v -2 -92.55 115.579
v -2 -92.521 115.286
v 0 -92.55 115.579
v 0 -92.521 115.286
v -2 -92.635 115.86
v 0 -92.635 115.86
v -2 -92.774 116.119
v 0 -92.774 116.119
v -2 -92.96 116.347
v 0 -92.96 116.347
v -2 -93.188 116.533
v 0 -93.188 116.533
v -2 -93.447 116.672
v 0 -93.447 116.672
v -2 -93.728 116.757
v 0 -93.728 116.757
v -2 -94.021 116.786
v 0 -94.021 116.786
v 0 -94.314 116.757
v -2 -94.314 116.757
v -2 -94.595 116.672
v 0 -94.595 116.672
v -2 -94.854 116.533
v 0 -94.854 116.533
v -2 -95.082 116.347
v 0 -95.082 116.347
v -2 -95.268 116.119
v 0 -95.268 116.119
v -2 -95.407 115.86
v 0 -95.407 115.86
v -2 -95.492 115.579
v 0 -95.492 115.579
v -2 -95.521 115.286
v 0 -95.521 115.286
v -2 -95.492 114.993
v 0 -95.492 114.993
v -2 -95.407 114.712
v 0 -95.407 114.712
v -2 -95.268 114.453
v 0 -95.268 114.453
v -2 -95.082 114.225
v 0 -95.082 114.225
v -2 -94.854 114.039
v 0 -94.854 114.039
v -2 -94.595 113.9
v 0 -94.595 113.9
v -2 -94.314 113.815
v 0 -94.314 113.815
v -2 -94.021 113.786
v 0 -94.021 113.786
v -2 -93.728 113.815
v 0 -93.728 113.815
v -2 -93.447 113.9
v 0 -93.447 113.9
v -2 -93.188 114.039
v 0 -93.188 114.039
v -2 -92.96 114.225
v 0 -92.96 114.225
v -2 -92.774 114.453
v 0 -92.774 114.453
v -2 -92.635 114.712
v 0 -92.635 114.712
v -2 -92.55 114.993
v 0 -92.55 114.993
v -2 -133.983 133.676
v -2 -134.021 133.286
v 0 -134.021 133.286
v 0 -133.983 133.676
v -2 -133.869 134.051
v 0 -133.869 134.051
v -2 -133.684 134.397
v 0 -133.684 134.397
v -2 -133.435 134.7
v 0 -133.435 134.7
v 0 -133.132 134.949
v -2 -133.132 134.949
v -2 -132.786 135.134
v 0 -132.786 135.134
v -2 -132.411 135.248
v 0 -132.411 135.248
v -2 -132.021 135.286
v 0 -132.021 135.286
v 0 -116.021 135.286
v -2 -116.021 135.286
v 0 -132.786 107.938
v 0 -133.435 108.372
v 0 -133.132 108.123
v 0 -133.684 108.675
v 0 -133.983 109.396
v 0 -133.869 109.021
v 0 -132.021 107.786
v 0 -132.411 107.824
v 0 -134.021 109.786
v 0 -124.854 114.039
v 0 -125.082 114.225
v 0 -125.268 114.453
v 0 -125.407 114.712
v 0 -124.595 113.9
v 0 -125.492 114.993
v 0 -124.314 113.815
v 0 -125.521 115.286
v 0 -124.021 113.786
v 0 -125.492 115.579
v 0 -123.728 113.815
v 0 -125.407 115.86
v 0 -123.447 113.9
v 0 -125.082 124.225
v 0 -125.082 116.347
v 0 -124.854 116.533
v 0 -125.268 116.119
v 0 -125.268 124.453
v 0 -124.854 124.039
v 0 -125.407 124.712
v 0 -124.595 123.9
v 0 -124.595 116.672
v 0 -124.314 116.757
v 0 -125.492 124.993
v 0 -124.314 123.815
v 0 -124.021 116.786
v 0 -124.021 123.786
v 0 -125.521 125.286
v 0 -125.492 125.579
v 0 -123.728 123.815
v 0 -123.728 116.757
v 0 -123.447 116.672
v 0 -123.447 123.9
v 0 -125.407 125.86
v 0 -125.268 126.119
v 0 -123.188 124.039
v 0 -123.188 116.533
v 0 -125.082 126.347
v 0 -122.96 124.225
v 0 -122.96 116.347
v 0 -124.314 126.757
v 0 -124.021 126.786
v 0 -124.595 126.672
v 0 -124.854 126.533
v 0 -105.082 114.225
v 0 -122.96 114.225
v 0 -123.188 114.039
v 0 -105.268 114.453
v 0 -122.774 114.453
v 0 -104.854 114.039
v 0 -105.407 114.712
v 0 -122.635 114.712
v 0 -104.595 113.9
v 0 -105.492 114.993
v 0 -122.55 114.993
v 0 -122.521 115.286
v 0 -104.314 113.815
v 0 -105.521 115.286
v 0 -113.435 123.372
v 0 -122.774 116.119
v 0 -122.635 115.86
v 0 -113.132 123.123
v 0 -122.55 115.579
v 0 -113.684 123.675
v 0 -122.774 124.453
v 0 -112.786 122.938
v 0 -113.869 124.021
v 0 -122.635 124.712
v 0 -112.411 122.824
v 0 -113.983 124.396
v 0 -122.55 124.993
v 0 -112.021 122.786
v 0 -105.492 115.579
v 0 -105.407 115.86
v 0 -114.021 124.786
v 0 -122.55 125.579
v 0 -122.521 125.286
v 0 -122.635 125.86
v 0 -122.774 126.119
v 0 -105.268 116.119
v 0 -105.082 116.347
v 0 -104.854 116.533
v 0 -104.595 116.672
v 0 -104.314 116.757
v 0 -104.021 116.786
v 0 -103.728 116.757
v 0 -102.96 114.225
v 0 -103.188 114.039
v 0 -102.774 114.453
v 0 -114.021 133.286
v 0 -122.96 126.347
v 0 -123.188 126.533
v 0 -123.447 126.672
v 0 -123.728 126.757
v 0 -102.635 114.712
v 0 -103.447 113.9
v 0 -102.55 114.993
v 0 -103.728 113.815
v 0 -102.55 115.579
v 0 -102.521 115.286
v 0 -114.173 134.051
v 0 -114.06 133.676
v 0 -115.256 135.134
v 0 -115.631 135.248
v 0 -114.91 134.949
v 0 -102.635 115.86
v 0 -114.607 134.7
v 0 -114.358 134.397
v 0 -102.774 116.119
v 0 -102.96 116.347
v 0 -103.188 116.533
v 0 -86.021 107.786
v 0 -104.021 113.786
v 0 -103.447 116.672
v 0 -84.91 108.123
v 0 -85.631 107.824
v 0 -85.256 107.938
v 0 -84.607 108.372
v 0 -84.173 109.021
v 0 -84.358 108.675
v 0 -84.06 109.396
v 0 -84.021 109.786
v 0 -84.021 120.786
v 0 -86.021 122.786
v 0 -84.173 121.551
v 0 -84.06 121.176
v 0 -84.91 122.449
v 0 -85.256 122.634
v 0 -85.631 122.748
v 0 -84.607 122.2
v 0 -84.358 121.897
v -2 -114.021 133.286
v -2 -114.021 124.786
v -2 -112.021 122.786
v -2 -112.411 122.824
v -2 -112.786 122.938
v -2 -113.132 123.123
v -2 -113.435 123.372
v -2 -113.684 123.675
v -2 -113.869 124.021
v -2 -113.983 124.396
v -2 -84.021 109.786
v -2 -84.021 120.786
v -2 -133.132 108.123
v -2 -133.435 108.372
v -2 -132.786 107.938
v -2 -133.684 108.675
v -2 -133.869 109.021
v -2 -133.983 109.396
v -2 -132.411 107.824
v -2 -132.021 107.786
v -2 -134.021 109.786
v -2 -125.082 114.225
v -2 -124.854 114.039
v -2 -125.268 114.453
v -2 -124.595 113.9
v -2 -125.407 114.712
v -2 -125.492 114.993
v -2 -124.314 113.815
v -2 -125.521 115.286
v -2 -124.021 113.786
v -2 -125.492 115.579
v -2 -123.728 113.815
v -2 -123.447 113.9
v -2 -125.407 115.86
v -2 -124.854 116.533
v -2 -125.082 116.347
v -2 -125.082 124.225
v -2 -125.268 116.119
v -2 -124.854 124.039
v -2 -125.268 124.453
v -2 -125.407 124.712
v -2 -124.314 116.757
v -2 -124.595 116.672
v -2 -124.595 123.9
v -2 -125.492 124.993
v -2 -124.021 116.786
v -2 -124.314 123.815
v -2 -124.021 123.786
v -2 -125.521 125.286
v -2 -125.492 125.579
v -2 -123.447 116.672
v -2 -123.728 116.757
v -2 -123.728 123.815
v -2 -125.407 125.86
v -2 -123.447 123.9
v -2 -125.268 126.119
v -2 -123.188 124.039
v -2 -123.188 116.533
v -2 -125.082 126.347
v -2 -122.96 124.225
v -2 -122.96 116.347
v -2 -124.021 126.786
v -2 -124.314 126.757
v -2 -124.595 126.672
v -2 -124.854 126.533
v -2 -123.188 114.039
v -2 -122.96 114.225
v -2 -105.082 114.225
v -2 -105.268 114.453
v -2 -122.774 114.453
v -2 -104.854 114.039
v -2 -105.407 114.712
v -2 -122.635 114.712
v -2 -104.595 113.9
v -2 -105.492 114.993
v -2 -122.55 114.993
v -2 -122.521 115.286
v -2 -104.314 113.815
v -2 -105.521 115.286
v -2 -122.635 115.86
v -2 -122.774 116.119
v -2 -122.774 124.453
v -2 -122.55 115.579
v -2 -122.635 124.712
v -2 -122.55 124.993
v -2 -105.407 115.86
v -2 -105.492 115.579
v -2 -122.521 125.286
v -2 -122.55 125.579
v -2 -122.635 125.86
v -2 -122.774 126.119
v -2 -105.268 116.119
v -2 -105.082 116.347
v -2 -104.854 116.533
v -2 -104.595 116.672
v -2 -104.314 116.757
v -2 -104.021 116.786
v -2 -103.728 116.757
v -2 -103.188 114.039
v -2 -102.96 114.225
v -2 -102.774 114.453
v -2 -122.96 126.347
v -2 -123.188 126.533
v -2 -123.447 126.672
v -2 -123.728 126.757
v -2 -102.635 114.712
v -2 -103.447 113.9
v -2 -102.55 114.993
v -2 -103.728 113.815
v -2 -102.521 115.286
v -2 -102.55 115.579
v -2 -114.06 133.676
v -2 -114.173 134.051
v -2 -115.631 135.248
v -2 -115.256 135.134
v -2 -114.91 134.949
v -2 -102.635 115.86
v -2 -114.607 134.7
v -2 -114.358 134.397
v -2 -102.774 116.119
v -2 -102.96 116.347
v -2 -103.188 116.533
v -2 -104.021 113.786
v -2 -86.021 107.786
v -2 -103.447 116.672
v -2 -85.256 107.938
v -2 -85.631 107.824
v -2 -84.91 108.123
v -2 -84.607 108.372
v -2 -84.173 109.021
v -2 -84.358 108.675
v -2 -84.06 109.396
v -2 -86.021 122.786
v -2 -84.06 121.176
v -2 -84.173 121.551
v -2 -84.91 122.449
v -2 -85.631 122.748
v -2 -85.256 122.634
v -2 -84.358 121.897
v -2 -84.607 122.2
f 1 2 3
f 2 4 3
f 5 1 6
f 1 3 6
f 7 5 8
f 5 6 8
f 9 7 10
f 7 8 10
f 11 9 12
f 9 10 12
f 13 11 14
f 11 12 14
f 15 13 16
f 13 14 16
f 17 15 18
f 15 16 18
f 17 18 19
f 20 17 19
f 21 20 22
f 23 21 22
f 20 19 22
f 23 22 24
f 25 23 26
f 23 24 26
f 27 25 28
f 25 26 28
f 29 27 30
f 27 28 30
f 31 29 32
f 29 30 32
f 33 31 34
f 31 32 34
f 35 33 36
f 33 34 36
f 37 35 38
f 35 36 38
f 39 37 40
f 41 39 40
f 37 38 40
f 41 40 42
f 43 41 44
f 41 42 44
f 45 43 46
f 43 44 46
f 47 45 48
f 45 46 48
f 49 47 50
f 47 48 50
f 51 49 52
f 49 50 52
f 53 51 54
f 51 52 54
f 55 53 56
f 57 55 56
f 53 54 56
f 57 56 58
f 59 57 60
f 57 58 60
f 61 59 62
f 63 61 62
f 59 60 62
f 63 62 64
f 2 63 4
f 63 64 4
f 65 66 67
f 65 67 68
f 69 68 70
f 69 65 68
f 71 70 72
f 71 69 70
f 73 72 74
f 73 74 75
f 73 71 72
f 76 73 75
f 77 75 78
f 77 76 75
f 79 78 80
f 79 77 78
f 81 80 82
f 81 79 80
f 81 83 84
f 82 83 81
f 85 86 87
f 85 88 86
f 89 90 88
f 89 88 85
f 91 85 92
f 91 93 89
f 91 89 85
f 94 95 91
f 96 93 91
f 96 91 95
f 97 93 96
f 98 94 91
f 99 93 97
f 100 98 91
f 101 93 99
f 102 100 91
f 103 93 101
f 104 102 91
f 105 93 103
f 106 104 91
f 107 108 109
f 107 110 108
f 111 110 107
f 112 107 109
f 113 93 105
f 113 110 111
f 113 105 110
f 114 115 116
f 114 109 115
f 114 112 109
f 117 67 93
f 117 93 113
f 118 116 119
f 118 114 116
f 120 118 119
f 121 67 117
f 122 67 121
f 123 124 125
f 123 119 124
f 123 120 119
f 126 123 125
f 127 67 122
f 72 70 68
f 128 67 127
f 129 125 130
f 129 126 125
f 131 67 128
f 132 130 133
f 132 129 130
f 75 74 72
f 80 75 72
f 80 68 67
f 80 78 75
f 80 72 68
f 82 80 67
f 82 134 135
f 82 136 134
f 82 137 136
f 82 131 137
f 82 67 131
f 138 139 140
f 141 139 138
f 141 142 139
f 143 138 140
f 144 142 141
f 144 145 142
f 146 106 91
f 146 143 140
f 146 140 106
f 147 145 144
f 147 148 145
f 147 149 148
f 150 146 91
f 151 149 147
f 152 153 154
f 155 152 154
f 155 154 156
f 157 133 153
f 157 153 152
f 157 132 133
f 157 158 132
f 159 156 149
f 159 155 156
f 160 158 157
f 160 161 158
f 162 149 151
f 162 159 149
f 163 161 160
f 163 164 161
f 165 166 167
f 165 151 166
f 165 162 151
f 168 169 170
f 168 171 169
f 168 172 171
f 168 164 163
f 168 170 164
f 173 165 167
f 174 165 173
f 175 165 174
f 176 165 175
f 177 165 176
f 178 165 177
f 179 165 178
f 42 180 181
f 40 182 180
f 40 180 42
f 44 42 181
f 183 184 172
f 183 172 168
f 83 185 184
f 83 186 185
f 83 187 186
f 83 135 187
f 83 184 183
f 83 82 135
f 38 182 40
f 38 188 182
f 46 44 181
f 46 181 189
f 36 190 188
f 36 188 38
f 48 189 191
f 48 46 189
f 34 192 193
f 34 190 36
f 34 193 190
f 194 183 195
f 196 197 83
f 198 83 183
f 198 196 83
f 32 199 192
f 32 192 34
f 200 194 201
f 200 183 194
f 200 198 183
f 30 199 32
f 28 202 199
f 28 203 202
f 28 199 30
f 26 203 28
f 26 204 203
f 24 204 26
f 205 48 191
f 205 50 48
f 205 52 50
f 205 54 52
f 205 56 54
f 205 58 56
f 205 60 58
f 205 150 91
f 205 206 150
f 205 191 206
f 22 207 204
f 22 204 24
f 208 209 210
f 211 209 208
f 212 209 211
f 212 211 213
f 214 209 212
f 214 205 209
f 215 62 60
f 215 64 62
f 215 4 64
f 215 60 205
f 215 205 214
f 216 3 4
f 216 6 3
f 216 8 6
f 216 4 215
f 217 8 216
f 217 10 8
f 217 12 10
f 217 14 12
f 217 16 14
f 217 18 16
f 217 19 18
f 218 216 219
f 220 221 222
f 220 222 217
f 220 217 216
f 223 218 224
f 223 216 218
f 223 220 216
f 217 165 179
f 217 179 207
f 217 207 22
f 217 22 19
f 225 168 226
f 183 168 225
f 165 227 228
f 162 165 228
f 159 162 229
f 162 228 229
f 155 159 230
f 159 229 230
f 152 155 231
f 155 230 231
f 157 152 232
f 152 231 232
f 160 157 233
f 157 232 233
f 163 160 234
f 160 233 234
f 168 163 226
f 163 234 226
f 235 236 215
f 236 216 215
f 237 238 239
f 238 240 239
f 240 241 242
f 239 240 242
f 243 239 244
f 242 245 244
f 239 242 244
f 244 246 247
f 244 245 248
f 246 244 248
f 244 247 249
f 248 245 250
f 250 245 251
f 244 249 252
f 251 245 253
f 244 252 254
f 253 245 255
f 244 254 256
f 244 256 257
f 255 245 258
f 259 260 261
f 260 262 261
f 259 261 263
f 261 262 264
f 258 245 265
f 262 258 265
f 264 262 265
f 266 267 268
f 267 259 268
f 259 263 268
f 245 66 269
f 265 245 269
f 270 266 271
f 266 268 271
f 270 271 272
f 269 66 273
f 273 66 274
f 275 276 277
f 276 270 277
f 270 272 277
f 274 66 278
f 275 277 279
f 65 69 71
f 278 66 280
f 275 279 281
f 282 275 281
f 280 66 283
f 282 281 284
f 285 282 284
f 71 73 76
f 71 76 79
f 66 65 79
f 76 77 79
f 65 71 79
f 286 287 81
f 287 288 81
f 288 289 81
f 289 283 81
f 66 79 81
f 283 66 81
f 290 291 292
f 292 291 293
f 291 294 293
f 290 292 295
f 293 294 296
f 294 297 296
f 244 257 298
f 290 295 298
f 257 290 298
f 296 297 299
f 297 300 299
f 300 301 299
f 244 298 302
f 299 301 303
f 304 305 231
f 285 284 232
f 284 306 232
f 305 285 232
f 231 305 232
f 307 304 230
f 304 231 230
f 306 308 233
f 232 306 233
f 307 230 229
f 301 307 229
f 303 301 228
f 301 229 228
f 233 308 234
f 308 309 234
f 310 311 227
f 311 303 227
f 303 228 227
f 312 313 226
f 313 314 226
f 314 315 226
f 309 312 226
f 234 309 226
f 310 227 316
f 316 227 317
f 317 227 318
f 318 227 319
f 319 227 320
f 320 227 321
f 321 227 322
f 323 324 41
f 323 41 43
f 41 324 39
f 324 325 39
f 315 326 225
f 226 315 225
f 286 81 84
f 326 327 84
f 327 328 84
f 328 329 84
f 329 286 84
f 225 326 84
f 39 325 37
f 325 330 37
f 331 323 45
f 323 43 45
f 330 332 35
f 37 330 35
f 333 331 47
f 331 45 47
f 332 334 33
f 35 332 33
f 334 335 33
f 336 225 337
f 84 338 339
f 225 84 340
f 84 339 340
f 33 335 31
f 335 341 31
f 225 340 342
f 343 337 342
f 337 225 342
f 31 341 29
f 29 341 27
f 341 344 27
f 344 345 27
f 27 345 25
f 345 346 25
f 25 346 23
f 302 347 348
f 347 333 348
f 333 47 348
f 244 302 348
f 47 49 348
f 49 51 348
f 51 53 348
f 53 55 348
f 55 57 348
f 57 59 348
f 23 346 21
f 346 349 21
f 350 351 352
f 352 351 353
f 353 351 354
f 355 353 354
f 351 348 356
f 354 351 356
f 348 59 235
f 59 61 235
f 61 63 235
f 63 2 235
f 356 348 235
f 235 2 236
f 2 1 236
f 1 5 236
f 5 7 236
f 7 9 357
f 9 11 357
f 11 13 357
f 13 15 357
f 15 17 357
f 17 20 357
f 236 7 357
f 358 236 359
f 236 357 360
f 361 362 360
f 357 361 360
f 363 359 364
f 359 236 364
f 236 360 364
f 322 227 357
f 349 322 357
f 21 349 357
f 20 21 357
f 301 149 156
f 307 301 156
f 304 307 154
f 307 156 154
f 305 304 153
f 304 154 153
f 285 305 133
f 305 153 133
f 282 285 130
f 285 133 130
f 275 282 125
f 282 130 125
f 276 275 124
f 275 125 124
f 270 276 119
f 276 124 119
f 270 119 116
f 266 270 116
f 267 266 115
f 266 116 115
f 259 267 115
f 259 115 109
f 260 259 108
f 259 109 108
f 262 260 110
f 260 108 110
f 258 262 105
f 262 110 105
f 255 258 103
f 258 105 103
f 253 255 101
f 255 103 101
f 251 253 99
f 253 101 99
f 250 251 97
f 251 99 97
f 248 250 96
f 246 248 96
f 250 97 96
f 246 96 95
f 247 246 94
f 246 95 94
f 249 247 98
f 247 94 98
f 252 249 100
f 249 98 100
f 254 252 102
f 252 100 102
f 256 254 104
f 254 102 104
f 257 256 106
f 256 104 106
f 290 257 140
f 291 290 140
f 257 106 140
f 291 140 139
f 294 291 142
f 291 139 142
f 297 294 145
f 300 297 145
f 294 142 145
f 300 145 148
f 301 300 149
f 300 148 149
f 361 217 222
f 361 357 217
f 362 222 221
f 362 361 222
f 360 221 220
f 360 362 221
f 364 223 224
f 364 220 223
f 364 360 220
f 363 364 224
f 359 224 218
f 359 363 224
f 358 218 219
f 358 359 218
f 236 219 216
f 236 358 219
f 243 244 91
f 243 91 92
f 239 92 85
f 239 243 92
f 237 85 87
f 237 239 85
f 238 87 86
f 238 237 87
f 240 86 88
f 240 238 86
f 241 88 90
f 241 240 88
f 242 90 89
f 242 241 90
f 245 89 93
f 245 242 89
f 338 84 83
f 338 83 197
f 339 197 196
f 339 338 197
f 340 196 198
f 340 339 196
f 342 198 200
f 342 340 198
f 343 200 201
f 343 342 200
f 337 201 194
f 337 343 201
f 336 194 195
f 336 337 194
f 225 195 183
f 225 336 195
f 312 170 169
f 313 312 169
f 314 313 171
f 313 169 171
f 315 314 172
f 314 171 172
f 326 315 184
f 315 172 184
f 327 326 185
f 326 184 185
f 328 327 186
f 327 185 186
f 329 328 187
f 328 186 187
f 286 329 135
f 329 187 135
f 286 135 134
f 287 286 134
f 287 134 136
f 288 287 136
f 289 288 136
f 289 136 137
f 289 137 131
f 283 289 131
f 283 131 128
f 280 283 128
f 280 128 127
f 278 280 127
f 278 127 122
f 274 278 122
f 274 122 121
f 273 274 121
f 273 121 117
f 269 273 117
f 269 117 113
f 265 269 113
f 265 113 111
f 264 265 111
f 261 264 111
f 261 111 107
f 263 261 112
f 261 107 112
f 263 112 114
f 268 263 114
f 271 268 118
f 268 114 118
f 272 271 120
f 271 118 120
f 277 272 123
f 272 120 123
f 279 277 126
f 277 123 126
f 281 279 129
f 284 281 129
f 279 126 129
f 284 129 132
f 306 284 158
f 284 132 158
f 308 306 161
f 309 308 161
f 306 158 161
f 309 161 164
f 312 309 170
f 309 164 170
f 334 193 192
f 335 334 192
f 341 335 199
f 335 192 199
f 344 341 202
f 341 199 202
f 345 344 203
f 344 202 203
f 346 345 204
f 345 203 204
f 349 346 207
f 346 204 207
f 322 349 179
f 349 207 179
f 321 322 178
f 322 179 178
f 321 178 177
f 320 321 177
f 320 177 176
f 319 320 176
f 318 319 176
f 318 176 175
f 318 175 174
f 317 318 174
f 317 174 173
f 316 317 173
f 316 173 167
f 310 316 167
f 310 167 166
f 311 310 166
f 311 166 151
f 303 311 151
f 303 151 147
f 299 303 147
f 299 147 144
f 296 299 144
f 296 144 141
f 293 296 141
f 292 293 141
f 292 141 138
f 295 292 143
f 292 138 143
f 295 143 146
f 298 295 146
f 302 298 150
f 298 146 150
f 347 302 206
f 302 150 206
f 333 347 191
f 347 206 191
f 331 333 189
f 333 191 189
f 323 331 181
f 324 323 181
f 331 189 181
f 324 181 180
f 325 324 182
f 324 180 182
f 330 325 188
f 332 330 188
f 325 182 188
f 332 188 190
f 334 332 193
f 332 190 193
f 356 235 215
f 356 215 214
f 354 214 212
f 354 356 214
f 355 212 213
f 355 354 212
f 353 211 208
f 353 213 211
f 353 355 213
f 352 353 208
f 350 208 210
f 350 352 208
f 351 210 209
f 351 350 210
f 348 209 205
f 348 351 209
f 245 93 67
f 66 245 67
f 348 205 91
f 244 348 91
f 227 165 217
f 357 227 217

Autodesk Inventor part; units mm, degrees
ref_plane "YZ Plane" through (0, 0, 0) normal (1, 0, 0) x (0, 1, 0)
ref_plane "XZ Plane" through (0, 0, 0) normal (0, 1, 0) x (-1, 0, 0)
ref_plane "XY Plane" through (0, 0, 0) normal (0, 0, 1) x (1, 0, 0)
sketch "スケッチ1" plane through (0, 0, 0) normal (1, 0, 0) x (0, 1, 0)
  line L0 (-114.0211, -198.214) -> (-114.0211, 205.786)
  line L1 (-114.0211, 122.786) -> (139.9789, 122.786)
  line L2 (139.9789, 122.786) -> (139.9789, 107.786)
  line L3 (139.9789, 107.786) -> (-114.0211, 107.786)
  line L4 (-114.0211, 107.786) -> (-114.0211, 122.786)
  line L5 (-74.0211, 147.286) -> (134.9789, 147.286)
  line L6 (134.9789, 147.286) -> (134.9789, -139.714)
  line L7 (134.9789, -139.714) -> (-74.0211, -139.714)
  line L8 (-74.0211, -139.714) -> (-74.0211, 147.286)
  line L9 (-134.0211, -198.214) -> (-134.0211, 205.786)
  line L10 (-134.0211, 3.786) -> (-114.0211, 3.786)
  line L11 (-114.0211, 205.786) -> (-134.0211, 205.786)
  line L12 (-114.0211, -115.214) -> (139.9789, -115.214)
  line L13 (139.9789, -100.214) -> (-114.0211, -100.214)
  line L14 (139.9789, -115.214) -> (139.9789, -100.214)
  line L15 (92.4789, 157.286) -> (82.4789, 157.286)
  line L16 (82.4789, 157.286) -> (82.4789, 3.786)
  line L17 (82.4789, 3.786) -> (92.4789, 3.786)
  line L18 (92.4789, 3.786) -> (92.4789, 157.286)
  line L19 (-21.5211, 157.286) -> (-31.5211, 157.286)
  line L20 (-31.5211, 157.286) -> (-31.5211, 3.786)
  line L21 (-31.5211, 3.786) -> (-21.5211, 3.786)
  line L22 (-21.5211, 3.786) -> (-21.5211, 157.286)
  line L23 (-114.0211, 135.286) -> (-134.0211, 135.286)
  line L24 (-84.0211, 122.786) -> (-84.0211, 107.786)
  circle A0 centre (-124.0211, 115.286) radius 1.5
  circle A1 centre (-124.0211, 125.286) radius 1.5
  line L25 (-114.0211, 135.286) -> (-114.0211, 122.786)
  line L26 (-114.0211, 107.786) -> (-134.0211, 107.786)
  line L27 (-134.0211, 135.286) -> (-134.0211, 107.786)
  circle A2 centre (-104.0211, 115.286) radius 1.5
  circle A3 centre (-94.0211, 115.286) radius 1.5
  line L28 (-84.0211, 107.786) -> (-64.0211, 107.786)
  line L29 (-64.0211, 107.786) -> (-64.0211, 101.786)
  line L30 (-64.0211, 101.786) -> (-84.0211, 101.786)
  line L31 (-84.0211, 101.786) -> (-84.0211, 107.786)
  line L32 (-31.5211, 157.286) -> (-37.5211, 157.286)
  line L33 (-37.5211, 157.286) -> (-37.5211, 137.286)
  line L34 (-37.5211, 137.286) -> (-31.5211, 137.286)
  line L35 (-31.5211, 137.286) -> (-31.5211, 157.286)
  line L36 (92.4789, 157.286) -> (98.4789, 157.286)
  line L37 (98.4789, 157.286) -> (98.4789, 137.286)
  line L38 (98.4789, 137.286) -> (92.4789, 137.286)
  line L39 (92.4789, 137.286) -> (92.4789, 157.286)
  line L40 (30.4789, 147.286) -> (30.4789, -139.714)
  line L41 (134.9789, 3.786) -> (-114.0211, 3.786)
  line L42 (-114.0211, 205.786) -> (-114.0211, -198.214)
  line L43 (-84.0211, -94.214) -> (-84.0211, -100.214)
  line L44 (-64.0211, -94.214) -> (-84.0211, -94.214)
  line L45 (-64.0211, -100.214) -> (-64.0211, -94.214)
  line L46 (-84.0211, -115.214) -> (-84.0211, -100.214)
  circle A4 centre (-94.0211, -107.714) radius 1.5
  circle A5 centre (-104.0211, -107.714) radius 1.5
  circle A6 centre (-124.0211, -107.714) radius 1.5
  circle A7 centre (-124.0211, -117.714) radius 1.5
  line L47 (-114.0211, -127.714) -> (-134.0211, -127.714)
  line L48 (-114.0211, -100.214) -> (-134.0211, -100.214)
  line L49 (-37.5211, -149.714) -> (-37.5211, -129.714)
  line L50 (-31.5211, -149.714) -> (-37.5211, -149.714)
  line L51 (-21.5211, -149.714) -> (-31.5211, -149.714)
  line L52 (-31.5211, -149.714) -> (-31.5211, 3.786)
  line L53 (-21.5211, 3.786) -> (-21.5211, -149.714)
  line L54 (-37.5211, -129.714) -> (-31.5211, -129.714)
  line L55 (82.4789, -149.714) -> (82.4789, 3.786)
  line L56 (92.4789, -149.714) -> (82.4789, -149.714)
  line L57 (92.4789, -149.714) -> (98.4789, -149.714)
  line L58 (98.4789, -149.714) -> (98.4789, -129.714)
  line L59 (98.4789, -129.714) -> (92.4789, -129.714)
  line L60 (92.4789, 3.786) -> (92.4789, -149.714)
  circle A8 centre (-26.5211, 115.286) radius 1.5
  circle A9 centre (87.4789, 115.286) radius 1.5
  circle A10 centre (87.4789, -107.714) radius 1.5
  circle A11 centre (-26.5211, -107.714) radius 1.5
  line L61 (-114.0211, 122.786) -> (-114.0211, 107.786)
  line L62 (-114.0211, -100.214) -> (-114.0211, -115.214)
  point P0 (0, 0)
  point P1 (-114.0211, 3.786)
  point P2 (-114.0211, 3.786)
  point P3 (-114.0211, 107.786)
  dimension "d0" = 15
  dimension "d1" = 287
  dimension "d2" = 209
  dimension "d3" = 83
  dimension "d4" = 10
  dimension "d5" = 10
  dimension "d6" = 30
  dimension "d7" = 3
  dimension "d8" = 7.5
  dimension "d9" = 10
  dimension "d10" = 3
  dimension "d11" = 10
  dimension "d12" = 10
  dimension "d13" = 10
  dimension "d14" = 3
  dimension "d15" = 3
  dimension "d16" = 10
  dimension "d17" = 10
  dimension "d18" = 7.5
  dimension "d19" = 7.5
  dimension "d20" = 6
  dimension "d21" = 10
  dimension "d22" = 10
  dimension "d23" = 5
  dimension "d24" = 143.5
  dimension "d25" = 10
  dimension "d26" = 6
  dimension "d27" = 20
  dimension "d28" = 10
  dimension "d29" = 6
  dimension "d30" = 20
  dimension "d31" = 0
  dimension "d32" = 0
  dimension "d33" = 52
  dimension "d34" = 52
  dimension "d35" = 3
  dimension "d36" = 3
  dimension "d37" = 5
  dimension "d38" = 7.5
  dimension "d39" = 7.5
  dimension "d40" = 5
extrude "押し出し1" add sketch "スケッチ1" against normal blind 2 contours L26 L9 L23 L0 | L0 L1 L24 L3
fillet "フィレット1" radius 2 6 edges at (-1, -84.0211, 122.786) (-1, -84.0211, 107.786) (-1, -114.0211, 122.786) (-1, -114.0211, 135.286) (-1, -134.0211, 135.286) (-1, -134.0211, 107.786)
equation "\"d13\" = d9"
equation "\"d17\" = d16"
equation "\"d19\" = d18"
equation "\"d34\" = d33"
properties part number "base_weel-v2-Plate-8" material "アルミニウム 6061"
